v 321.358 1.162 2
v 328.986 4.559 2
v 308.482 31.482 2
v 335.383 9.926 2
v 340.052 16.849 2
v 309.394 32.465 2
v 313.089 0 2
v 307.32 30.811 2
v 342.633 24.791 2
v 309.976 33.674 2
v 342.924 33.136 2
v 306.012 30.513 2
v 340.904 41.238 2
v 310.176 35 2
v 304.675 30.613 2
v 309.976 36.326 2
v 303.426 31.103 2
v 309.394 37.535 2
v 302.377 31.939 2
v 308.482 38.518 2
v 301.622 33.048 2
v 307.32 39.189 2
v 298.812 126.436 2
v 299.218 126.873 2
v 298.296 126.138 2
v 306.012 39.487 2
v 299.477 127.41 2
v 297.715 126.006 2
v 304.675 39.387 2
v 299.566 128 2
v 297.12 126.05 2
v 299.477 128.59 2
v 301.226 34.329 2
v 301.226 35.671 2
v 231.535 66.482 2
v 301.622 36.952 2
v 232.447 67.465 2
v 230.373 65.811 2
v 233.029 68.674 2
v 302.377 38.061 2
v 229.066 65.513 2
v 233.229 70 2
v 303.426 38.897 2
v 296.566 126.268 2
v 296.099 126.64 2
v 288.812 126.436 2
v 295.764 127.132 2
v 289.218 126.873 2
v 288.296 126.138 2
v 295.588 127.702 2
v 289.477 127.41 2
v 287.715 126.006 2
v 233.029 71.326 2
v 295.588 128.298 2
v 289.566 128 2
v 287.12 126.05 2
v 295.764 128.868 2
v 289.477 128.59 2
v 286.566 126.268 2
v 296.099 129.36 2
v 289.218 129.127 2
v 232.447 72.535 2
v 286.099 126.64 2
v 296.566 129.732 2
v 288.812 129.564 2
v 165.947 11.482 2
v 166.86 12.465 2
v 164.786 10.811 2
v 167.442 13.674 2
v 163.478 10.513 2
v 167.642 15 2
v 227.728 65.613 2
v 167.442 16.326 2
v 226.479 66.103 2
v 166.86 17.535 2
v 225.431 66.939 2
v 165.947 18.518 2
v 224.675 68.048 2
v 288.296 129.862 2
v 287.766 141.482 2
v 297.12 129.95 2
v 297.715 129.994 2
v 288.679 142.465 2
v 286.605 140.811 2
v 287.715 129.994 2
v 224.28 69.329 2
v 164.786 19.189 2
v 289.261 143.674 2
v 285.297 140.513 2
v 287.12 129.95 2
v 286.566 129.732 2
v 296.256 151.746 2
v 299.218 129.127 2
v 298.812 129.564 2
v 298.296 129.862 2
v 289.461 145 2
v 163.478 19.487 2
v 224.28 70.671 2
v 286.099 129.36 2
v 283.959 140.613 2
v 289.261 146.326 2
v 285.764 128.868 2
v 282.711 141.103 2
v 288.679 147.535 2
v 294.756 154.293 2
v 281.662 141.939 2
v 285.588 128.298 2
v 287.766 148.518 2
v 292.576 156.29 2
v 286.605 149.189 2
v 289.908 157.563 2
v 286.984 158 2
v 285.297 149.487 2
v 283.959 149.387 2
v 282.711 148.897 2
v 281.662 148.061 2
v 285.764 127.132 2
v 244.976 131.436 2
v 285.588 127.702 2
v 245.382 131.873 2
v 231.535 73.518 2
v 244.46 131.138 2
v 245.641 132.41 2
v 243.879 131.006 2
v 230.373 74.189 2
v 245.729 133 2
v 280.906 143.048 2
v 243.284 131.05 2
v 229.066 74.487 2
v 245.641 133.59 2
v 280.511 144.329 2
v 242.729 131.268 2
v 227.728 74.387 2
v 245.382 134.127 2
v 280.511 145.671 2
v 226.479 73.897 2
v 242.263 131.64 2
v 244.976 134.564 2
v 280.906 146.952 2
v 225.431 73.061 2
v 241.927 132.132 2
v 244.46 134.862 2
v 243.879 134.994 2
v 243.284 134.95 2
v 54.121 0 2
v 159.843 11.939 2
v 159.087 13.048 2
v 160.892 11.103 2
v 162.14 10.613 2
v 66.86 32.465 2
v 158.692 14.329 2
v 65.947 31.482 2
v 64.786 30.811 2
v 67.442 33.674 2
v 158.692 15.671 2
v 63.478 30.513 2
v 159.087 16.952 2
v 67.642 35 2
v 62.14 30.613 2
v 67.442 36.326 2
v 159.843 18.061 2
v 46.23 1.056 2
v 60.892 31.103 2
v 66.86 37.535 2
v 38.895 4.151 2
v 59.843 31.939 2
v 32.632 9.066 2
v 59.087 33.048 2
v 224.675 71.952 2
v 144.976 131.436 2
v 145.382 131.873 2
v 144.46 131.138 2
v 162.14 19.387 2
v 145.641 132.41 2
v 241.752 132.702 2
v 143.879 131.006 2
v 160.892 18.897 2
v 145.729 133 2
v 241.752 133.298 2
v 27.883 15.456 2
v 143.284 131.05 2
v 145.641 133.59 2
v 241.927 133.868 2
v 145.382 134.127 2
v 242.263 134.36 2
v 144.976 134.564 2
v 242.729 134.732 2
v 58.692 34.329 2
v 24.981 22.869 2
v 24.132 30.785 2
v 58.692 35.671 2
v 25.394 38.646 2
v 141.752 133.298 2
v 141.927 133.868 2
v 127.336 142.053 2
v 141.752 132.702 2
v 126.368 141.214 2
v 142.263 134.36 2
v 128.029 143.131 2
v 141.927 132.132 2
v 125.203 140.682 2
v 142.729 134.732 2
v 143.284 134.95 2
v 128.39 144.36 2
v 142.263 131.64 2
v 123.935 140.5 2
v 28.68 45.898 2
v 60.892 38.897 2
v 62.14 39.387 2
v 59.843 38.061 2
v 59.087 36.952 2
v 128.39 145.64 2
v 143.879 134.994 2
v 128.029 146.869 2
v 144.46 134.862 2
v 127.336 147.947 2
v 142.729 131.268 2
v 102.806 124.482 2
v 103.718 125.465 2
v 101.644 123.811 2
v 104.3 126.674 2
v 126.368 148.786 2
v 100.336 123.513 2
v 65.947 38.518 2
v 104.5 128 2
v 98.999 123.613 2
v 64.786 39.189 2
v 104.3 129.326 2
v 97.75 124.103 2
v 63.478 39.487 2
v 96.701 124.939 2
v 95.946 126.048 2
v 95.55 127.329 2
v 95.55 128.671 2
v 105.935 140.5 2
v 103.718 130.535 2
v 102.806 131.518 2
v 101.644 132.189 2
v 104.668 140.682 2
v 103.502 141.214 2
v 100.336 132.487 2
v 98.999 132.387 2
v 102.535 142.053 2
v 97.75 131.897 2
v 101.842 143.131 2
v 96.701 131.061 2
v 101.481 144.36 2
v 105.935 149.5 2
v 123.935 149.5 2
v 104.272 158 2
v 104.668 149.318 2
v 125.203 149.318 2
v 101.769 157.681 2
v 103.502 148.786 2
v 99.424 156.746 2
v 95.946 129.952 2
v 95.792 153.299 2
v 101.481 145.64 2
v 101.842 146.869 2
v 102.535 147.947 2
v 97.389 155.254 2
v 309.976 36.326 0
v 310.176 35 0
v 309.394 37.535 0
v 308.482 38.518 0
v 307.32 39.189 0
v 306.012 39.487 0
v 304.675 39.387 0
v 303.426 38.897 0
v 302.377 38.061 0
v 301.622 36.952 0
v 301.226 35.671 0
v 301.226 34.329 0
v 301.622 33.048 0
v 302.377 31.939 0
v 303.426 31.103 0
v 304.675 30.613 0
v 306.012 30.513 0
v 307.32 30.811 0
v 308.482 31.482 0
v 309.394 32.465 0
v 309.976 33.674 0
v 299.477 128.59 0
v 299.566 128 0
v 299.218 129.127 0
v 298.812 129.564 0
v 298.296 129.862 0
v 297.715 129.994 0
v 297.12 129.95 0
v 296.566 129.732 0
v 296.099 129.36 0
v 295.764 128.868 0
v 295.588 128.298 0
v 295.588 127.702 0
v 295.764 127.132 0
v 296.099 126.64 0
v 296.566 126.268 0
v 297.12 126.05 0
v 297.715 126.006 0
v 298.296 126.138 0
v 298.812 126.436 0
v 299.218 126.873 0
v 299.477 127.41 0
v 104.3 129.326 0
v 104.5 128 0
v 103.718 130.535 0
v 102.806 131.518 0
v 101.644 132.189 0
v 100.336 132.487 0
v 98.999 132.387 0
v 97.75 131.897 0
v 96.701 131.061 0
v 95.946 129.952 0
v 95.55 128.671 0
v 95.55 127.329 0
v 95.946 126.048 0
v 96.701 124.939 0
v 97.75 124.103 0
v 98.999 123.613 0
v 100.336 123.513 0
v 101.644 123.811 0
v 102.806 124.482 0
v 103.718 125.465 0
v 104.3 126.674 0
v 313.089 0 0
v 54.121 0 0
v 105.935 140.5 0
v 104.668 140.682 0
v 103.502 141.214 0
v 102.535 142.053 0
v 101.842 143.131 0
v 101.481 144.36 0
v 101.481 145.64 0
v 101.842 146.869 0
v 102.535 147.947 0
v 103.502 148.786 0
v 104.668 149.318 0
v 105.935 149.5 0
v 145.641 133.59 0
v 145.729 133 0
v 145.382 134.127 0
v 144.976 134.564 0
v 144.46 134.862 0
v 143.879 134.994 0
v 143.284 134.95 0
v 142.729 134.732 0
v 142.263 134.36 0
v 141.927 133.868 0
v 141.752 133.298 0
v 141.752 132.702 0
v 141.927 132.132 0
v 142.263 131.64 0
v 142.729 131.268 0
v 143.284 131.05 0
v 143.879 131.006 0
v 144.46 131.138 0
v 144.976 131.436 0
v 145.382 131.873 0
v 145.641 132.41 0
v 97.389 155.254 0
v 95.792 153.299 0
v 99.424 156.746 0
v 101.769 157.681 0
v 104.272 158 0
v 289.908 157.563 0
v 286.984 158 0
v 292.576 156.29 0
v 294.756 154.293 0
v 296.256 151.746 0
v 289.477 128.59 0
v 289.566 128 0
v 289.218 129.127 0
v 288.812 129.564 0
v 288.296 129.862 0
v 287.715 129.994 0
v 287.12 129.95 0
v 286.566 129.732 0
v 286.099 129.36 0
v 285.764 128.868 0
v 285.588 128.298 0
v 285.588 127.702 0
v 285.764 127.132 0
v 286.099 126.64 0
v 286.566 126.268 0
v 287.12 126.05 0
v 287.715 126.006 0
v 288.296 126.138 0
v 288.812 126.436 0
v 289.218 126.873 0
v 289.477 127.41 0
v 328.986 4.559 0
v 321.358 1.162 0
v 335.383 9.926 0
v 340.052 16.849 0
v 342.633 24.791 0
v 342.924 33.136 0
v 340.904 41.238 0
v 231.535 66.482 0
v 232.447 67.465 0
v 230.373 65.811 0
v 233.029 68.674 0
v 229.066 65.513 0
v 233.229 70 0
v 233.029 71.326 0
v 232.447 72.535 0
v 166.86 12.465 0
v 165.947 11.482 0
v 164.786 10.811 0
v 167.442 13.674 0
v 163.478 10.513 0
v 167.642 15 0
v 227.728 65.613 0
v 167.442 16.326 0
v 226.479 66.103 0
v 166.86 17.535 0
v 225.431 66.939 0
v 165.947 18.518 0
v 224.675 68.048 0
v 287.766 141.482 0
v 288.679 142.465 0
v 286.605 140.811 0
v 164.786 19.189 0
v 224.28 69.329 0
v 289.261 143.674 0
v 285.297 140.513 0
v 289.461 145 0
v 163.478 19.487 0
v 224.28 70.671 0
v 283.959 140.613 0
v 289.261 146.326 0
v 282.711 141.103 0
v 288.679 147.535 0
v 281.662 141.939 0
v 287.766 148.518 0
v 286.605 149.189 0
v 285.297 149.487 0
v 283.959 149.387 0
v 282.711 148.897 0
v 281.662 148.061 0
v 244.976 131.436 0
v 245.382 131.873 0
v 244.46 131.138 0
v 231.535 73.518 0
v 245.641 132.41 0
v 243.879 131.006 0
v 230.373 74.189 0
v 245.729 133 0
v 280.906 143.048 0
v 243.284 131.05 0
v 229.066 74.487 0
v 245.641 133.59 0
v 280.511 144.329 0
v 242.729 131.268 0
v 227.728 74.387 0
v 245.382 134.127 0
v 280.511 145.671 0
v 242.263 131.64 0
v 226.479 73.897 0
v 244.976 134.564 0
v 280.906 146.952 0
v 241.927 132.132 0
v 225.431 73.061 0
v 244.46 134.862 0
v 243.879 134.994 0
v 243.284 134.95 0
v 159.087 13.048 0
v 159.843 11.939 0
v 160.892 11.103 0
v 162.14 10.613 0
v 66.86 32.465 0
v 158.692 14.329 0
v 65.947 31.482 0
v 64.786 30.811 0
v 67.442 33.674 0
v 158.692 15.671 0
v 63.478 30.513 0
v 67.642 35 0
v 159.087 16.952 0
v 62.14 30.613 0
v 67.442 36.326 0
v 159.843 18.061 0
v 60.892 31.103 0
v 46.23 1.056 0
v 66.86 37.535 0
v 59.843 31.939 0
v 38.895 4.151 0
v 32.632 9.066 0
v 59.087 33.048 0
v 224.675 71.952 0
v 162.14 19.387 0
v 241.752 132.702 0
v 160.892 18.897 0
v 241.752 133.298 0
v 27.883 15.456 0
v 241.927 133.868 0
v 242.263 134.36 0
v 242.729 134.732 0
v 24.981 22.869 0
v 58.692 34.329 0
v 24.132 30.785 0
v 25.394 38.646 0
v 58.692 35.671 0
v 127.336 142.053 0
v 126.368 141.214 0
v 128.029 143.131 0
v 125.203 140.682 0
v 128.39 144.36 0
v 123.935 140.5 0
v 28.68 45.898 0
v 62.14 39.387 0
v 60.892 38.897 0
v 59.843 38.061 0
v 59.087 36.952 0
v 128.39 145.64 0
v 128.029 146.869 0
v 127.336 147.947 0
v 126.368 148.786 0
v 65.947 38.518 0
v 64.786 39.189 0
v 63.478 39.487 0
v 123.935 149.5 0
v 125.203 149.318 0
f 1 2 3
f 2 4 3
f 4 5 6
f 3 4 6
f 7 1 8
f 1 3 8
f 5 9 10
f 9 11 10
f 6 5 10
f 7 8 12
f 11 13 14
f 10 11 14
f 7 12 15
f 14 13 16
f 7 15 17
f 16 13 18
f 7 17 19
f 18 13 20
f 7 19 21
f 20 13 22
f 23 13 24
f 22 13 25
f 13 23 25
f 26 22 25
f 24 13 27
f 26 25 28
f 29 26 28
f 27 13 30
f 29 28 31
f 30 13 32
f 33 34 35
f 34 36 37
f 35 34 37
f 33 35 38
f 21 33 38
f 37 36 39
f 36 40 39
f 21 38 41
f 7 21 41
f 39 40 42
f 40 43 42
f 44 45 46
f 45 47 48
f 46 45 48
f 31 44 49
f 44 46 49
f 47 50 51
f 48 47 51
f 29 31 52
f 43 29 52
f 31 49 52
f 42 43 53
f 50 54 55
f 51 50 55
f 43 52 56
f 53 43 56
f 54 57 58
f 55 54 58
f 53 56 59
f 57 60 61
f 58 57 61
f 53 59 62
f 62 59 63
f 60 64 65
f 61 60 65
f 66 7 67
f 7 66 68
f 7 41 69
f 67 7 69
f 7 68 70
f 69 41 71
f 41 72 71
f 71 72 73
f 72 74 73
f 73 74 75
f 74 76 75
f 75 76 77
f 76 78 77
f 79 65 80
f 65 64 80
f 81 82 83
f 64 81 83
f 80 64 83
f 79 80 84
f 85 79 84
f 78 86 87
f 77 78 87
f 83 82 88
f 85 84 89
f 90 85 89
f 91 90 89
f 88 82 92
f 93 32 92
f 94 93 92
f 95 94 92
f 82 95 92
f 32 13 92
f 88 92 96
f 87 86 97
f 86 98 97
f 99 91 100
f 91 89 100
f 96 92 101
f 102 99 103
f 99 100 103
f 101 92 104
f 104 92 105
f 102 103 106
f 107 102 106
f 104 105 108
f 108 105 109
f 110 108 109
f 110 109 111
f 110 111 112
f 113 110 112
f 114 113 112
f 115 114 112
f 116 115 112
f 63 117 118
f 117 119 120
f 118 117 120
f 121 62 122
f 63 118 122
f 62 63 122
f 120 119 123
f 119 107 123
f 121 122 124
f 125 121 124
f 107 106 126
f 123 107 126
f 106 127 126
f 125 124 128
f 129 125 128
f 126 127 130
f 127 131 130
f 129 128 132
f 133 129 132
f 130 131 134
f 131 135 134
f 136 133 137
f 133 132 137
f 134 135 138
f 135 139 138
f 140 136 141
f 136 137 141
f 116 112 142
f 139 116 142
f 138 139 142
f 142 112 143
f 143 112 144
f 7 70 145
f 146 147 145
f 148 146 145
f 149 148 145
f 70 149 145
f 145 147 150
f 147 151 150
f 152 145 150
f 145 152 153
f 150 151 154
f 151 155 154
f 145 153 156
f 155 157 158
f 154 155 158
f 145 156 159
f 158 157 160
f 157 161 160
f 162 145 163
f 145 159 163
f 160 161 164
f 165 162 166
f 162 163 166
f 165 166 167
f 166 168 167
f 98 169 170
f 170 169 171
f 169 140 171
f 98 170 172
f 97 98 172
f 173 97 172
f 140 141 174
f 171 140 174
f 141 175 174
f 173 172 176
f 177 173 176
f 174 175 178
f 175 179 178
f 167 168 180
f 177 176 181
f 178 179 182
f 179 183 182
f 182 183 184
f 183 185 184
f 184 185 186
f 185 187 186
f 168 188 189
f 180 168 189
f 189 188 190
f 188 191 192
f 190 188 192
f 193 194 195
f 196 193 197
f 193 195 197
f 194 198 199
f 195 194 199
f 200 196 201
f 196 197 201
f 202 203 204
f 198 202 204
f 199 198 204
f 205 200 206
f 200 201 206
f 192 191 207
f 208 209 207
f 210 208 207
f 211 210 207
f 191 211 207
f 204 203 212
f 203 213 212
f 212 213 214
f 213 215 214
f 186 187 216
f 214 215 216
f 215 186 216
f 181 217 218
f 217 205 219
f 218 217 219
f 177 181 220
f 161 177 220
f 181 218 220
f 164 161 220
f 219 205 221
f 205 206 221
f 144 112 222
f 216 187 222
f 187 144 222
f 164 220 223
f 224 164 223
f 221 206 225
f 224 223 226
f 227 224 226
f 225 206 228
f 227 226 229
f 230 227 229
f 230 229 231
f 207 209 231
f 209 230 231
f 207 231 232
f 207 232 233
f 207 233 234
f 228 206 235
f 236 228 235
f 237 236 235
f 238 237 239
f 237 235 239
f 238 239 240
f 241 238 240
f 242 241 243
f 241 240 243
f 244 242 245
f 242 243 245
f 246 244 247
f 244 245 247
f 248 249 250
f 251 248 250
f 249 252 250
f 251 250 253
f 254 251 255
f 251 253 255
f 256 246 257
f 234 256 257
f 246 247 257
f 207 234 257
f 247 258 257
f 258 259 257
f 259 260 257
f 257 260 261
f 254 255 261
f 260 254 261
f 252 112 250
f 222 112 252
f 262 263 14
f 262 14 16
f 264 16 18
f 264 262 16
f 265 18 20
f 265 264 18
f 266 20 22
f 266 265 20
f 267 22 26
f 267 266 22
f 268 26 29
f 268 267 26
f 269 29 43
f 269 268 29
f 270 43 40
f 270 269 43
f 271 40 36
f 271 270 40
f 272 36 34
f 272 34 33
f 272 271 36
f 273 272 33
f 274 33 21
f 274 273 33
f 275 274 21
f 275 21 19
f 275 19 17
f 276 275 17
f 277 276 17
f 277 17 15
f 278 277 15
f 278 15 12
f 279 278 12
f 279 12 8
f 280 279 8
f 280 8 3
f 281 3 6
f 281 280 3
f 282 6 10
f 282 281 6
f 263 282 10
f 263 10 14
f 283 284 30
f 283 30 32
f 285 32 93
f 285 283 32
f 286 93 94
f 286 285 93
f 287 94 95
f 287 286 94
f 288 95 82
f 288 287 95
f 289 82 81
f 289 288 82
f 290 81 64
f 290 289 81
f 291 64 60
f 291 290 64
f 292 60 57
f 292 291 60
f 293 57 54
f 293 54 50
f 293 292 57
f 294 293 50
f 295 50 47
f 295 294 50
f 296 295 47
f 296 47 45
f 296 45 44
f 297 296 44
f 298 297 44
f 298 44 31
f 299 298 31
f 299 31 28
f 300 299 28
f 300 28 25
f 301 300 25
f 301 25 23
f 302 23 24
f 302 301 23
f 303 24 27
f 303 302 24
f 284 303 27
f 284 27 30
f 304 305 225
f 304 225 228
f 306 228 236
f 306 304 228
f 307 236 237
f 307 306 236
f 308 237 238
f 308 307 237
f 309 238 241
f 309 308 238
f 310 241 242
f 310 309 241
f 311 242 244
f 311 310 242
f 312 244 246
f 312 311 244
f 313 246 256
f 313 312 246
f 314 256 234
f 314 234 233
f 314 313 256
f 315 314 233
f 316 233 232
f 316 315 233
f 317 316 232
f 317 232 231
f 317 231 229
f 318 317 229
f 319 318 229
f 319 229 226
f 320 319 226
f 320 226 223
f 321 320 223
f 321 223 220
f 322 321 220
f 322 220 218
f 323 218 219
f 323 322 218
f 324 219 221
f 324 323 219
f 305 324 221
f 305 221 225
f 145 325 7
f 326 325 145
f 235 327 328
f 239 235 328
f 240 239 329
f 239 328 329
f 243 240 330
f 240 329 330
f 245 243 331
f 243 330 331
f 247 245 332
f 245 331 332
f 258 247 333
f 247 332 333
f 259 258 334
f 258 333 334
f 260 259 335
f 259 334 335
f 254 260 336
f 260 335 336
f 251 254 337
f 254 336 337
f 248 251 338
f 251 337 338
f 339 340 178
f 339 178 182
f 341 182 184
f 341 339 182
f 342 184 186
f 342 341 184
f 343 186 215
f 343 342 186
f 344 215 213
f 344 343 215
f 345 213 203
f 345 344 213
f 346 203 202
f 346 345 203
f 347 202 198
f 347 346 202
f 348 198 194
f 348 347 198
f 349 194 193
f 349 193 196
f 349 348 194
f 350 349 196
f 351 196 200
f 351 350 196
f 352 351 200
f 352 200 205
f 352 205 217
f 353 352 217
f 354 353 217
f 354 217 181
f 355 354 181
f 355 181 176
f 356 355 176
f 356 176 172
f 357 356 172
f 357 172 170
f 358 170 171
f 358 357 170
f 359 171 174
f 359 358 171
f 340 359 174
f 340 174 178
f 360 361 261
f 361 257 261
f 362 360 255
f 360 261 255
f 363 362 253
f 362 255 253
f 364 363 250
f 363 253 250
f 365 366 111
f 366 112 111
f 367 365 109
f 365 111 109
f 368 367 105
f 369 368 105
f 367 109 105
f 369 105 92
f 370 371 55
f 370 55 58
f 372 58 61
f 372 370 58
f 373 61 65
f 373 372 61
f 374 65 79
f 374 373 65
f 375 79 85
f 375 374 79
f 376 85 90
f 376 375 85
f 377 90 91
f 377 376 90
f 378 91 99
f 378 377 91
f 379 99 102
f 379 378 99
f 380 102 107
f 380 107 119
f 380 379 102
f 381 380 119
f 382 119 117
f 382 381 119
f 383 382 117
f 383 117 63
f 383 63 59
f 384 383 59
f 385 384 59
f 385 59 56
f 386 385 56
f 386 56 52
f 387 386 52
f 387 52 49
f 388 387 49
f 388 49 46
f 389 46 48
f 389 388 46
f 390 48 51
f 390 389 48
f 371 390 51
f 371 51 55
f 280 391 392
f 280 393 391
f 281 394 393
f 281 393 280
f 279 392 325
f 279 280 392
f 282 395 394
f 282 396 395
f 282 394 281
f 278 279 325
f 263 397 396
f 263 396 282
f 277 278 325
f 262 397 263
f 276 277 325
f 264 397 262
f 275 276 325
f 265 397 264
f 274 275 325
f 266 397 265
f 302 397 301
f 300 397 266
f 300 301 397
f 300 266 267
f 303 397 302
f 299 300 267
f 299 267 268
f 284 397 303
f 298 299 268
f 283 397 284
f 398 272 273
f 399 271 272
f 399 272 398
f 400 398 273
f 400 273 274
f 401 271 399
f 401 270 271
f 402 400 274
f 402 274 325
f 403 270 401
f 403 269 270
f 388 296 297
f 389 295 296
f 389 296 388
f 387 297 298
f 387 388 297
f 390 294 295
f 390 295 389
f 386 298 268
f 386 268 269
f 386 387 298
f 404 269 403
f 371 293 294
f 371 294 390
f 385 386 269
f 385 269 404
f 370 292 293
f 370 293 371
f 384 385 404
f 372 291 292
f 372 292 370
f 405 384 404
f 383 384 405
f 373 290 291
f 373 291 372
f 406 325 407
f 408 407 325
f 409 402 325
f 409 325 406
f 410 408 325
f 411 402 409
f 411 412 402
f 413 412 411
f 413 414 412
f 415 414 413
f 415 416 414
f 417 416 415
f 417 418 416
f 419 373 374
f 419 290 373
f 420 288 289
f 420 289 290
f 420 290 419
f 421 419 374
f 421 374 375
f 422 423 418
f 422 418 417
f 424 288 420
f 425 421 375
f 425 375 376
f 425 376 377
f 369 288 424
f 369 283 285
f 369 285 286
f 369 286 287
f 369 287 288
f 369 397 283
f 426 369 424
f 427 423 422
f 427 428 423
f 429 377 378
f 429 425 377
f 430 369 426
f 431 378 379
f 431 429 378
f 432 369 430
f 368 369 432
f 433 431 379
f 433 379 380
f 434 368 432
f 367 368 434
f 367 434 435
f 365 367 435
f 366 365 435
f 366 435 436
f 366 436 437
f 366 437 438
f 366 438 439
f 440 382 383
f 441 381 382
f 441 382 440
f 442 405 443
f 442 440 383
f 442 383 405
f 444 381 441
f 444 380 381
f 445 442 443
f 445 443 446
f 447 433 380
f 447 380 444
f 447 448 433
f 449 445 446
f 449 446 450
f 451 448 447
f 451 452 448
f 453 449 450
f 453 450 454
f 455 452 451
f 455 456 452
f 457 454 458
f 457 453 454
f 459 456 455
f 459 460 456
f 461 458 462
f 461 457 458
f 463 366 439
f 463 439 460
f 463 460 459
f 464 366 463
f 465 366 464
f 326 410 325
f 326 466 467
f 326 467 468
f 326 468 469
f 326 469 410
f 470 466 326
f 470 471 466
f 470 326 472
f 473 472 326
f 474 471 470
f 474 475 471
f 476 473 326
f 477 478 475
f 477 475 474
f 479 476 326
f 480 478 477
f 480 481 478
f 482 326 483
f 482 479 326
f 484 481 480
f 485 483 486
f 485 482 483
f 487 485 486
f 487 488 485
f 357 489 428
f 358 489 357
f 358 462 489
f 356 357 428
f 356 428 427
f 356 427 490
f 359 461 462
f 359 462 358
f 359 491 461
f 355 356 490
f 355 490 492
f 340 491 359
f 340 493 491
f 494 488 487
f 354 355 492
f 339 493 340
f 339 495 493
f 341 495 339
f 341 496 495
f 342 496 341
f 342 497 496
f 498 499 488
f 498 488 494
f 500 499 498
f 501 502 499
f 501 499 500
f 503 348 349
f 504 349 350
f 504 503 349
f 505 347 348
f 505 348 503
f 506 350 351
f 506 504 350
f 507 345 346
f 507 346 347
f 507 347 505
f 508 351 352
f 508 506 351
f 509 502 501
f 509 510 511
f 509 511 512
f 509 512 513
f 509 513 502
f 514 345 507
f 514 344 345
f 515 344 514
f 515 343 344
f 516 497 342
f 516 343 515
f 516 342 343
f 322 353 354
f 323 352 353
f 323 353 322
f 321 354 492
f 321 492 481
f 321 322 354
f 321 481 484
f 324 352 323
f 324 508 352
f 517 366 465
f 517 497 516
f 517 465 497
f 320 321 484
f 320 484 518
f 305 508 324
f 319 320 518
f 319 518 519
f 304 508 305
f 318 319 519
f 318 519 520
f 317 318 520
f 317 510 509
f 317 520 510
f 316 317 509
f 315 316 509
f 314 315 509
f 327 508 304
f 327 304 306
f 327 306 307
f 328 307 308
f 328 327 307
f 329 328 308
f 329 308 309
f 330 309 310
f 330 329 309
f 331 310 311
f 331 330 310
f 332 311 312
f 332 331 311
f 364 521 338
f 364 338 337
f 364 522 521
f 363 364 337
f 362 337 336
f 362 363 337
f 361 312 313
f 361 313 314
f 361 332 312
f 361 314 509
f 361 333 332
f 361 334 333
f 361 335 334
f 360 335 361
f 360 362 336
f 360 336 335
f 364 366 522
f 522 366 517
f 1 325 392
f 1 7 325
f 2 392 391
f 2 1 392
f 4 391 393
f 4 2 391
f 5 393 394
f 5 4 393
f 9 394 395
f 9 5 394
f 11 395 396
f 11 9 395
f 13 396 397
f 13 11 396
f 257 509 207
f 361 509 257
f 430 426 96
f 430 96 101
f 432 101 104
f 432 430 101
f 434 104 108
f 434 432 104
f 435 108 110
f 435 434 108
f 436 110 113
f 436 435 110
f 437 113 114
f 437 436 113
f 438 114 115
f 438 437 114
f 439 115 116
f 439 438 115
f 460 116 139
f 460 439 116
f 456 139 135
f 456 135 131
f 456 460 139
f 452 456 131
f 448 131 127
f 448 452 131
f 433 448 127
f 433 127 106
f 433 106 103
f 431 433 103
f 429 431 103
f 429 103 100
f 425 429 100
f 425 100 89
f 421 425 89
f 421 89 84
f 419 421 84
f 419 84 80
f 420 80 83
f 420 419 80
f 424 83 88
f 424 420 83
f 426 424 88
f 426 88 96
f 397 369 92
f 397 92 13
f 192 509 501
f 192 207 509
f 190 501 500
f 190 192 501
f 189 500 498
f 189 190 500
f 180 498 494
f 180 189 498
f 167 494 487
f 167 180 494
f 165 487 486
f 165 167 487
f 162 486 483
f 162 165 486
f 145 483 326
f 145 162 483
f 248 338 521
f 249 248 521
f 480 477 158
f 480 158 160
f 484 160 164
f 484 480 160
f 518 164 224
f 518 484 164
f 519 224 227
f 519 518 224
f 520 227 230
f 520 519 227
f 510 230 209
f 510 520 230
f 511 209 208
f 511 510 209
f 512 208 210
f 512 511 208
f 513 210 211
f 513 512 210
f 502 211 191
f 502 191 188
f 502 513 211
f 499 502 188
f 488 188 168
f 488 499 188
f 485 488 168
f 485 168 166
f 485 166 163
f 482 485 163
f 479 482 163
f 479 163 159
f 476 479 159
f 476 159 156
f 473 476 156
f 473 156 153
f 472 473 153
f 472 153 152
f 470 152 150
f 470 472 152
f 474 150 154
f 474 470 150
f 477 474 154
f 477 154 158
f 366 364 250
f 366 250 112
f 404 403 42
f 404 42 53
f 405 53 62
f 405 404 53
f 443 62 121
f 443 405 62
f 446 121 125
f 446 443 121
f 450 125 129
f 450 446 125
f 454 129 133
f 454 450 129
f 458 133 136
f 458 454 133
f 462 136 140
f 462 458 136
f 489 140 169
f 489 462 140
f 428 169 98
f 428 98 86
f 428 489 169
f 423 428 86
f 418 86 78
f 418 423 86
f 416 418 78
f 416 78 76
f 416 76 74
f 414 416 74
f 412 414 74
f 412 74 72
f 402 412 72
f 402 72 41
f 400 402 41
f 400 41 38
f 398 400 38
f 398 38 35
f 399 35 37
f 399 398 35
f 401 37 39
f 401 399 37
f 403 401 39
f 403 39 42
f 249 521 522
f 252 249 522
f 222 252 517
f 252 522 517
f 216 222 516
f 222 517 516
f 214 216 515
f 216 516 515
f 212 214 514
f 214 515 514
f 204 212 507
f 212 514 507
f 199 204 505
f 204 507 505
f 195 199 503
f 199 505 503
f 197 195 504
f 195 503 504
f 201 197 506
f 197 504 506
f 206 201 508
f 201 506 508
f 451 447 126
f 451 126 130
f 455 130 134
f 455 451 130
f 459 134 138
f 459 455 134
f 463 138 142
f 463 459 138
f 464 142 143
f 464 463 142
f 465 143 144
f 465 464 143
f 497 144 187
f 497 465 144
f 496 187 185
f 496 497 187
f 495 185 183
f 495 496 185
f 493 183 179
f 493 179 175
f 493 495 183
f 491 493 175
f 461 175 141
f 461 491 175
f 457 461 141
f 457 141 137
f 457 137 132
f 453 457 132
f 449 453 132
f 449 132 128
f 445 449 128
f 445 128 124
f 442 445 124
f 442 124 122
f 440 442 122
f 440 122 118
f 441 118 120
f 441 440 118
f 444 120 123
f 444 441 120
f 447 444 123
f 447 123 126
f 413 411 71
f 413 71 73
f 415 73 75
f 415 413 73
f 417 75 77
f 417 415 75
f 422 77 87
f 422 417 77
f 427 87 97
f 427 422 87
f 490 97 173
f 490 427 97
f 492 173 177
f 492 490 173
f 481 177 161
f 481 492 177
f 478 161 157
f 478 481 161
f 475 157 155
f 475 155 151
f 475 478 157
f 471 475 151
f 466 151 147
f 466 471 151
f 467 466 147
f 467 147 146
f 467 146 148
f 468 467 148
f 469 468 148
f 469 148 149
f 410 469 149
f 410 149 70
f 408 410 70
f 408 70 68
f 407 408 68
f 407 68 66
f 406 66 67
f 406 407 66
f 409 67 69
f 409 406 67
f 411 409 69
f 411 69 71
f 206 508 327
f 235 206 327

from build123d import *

# Parameters (mm, degrees)
SKETCH1_R           = 4.5
SKETCH1_R_2         = 2
BOSS_EXTRUDE1_DEPTH = 2
FILLET1_R           = 30
FILLET2_R           = 10


with BuildPart() as part:
    # Sketch1 → Boss-Extrude1 (new body)
    with BuildSketch(Plane.XY):
        Polygon((0, 0), (98.729357602, 158), (293.729357602, 158), (357.565501284, 0), align=None)
        with Locations((284.960746883, 145)):
            Circle(SKETCH1_R, mode=Mode.SUBTRACT)
        with Locations((305.675867386, 35)):
            Circle(SKETCH1_R, mode=Mode.SUBTRACT)
        with Locations((63.141671434, 35)):
            Circle(SKETCH1_R, mode=Mode.SUBTRACT)
        with Locations((163.141671434, 15)):
            Circle(SKETCH1_R, mode=Mode.SUBTRACT)
        with Locations((228.729357602, 70)):
            Circle(SKETCH1_R, mode=Mode.SUBTRACT)
        with Locations((100, 128)):
            Circle(SKETCH1_R, mode=Mode.SUBTRACT)
        with Locations((243.729357602, 133)):
            Circle(SKETCH1_R_2, mode=Mode.SUBTRACT)
        with Locations((143.729357602, 133)):
            Circle(SKETCH1_R_2, mode=Mode.SUBTRACT)
        with Locations((297.565501284, 128)):
            Circle(SKETCH1_R_2, mode=Mode.SUBTRACT)
        with Locations((287.565501284, 128)):
            Circle(SKETCH1_R_2, mode=Mode.SUBTRACT)
        with BuildLine():
            Line((105.935375271, 149.5), (123.935375271, 149.5))
            ThreePointArc((123.935375271, 149.5), (128.435375271, 145), (123.935375271, 140.5))
            Line((123.935375271, 140.5), (105.935375271, 140.5))
            ThreePointArc((105.935375271, 140.5), (101.435375271, 145), (105.935375271, 149.5))
        make_face(mode=Mode.SUBTRACT)
    extrude(amount=BOSS_EXTRUDE1_DEPTH)

    # Fillet1
    fillet1_edges = [part.edges().sort_by_distance(p)[0] for p in [
        (0, 0, 1),
        (357.565501284, 0, 1),
    ]]
    fillet(fillet1_edges, radius=FILLET1_R)

    # Fillet2
    fillet2_edges = [part.edges().sort_by_distance(p)[0] for p in [
        (98.729357602, 158, 1),
        (293.729357602, 158, 1),
    ]]
    fillet(fillet2_edges, radius=FILLET2_R)


solid = part.part
